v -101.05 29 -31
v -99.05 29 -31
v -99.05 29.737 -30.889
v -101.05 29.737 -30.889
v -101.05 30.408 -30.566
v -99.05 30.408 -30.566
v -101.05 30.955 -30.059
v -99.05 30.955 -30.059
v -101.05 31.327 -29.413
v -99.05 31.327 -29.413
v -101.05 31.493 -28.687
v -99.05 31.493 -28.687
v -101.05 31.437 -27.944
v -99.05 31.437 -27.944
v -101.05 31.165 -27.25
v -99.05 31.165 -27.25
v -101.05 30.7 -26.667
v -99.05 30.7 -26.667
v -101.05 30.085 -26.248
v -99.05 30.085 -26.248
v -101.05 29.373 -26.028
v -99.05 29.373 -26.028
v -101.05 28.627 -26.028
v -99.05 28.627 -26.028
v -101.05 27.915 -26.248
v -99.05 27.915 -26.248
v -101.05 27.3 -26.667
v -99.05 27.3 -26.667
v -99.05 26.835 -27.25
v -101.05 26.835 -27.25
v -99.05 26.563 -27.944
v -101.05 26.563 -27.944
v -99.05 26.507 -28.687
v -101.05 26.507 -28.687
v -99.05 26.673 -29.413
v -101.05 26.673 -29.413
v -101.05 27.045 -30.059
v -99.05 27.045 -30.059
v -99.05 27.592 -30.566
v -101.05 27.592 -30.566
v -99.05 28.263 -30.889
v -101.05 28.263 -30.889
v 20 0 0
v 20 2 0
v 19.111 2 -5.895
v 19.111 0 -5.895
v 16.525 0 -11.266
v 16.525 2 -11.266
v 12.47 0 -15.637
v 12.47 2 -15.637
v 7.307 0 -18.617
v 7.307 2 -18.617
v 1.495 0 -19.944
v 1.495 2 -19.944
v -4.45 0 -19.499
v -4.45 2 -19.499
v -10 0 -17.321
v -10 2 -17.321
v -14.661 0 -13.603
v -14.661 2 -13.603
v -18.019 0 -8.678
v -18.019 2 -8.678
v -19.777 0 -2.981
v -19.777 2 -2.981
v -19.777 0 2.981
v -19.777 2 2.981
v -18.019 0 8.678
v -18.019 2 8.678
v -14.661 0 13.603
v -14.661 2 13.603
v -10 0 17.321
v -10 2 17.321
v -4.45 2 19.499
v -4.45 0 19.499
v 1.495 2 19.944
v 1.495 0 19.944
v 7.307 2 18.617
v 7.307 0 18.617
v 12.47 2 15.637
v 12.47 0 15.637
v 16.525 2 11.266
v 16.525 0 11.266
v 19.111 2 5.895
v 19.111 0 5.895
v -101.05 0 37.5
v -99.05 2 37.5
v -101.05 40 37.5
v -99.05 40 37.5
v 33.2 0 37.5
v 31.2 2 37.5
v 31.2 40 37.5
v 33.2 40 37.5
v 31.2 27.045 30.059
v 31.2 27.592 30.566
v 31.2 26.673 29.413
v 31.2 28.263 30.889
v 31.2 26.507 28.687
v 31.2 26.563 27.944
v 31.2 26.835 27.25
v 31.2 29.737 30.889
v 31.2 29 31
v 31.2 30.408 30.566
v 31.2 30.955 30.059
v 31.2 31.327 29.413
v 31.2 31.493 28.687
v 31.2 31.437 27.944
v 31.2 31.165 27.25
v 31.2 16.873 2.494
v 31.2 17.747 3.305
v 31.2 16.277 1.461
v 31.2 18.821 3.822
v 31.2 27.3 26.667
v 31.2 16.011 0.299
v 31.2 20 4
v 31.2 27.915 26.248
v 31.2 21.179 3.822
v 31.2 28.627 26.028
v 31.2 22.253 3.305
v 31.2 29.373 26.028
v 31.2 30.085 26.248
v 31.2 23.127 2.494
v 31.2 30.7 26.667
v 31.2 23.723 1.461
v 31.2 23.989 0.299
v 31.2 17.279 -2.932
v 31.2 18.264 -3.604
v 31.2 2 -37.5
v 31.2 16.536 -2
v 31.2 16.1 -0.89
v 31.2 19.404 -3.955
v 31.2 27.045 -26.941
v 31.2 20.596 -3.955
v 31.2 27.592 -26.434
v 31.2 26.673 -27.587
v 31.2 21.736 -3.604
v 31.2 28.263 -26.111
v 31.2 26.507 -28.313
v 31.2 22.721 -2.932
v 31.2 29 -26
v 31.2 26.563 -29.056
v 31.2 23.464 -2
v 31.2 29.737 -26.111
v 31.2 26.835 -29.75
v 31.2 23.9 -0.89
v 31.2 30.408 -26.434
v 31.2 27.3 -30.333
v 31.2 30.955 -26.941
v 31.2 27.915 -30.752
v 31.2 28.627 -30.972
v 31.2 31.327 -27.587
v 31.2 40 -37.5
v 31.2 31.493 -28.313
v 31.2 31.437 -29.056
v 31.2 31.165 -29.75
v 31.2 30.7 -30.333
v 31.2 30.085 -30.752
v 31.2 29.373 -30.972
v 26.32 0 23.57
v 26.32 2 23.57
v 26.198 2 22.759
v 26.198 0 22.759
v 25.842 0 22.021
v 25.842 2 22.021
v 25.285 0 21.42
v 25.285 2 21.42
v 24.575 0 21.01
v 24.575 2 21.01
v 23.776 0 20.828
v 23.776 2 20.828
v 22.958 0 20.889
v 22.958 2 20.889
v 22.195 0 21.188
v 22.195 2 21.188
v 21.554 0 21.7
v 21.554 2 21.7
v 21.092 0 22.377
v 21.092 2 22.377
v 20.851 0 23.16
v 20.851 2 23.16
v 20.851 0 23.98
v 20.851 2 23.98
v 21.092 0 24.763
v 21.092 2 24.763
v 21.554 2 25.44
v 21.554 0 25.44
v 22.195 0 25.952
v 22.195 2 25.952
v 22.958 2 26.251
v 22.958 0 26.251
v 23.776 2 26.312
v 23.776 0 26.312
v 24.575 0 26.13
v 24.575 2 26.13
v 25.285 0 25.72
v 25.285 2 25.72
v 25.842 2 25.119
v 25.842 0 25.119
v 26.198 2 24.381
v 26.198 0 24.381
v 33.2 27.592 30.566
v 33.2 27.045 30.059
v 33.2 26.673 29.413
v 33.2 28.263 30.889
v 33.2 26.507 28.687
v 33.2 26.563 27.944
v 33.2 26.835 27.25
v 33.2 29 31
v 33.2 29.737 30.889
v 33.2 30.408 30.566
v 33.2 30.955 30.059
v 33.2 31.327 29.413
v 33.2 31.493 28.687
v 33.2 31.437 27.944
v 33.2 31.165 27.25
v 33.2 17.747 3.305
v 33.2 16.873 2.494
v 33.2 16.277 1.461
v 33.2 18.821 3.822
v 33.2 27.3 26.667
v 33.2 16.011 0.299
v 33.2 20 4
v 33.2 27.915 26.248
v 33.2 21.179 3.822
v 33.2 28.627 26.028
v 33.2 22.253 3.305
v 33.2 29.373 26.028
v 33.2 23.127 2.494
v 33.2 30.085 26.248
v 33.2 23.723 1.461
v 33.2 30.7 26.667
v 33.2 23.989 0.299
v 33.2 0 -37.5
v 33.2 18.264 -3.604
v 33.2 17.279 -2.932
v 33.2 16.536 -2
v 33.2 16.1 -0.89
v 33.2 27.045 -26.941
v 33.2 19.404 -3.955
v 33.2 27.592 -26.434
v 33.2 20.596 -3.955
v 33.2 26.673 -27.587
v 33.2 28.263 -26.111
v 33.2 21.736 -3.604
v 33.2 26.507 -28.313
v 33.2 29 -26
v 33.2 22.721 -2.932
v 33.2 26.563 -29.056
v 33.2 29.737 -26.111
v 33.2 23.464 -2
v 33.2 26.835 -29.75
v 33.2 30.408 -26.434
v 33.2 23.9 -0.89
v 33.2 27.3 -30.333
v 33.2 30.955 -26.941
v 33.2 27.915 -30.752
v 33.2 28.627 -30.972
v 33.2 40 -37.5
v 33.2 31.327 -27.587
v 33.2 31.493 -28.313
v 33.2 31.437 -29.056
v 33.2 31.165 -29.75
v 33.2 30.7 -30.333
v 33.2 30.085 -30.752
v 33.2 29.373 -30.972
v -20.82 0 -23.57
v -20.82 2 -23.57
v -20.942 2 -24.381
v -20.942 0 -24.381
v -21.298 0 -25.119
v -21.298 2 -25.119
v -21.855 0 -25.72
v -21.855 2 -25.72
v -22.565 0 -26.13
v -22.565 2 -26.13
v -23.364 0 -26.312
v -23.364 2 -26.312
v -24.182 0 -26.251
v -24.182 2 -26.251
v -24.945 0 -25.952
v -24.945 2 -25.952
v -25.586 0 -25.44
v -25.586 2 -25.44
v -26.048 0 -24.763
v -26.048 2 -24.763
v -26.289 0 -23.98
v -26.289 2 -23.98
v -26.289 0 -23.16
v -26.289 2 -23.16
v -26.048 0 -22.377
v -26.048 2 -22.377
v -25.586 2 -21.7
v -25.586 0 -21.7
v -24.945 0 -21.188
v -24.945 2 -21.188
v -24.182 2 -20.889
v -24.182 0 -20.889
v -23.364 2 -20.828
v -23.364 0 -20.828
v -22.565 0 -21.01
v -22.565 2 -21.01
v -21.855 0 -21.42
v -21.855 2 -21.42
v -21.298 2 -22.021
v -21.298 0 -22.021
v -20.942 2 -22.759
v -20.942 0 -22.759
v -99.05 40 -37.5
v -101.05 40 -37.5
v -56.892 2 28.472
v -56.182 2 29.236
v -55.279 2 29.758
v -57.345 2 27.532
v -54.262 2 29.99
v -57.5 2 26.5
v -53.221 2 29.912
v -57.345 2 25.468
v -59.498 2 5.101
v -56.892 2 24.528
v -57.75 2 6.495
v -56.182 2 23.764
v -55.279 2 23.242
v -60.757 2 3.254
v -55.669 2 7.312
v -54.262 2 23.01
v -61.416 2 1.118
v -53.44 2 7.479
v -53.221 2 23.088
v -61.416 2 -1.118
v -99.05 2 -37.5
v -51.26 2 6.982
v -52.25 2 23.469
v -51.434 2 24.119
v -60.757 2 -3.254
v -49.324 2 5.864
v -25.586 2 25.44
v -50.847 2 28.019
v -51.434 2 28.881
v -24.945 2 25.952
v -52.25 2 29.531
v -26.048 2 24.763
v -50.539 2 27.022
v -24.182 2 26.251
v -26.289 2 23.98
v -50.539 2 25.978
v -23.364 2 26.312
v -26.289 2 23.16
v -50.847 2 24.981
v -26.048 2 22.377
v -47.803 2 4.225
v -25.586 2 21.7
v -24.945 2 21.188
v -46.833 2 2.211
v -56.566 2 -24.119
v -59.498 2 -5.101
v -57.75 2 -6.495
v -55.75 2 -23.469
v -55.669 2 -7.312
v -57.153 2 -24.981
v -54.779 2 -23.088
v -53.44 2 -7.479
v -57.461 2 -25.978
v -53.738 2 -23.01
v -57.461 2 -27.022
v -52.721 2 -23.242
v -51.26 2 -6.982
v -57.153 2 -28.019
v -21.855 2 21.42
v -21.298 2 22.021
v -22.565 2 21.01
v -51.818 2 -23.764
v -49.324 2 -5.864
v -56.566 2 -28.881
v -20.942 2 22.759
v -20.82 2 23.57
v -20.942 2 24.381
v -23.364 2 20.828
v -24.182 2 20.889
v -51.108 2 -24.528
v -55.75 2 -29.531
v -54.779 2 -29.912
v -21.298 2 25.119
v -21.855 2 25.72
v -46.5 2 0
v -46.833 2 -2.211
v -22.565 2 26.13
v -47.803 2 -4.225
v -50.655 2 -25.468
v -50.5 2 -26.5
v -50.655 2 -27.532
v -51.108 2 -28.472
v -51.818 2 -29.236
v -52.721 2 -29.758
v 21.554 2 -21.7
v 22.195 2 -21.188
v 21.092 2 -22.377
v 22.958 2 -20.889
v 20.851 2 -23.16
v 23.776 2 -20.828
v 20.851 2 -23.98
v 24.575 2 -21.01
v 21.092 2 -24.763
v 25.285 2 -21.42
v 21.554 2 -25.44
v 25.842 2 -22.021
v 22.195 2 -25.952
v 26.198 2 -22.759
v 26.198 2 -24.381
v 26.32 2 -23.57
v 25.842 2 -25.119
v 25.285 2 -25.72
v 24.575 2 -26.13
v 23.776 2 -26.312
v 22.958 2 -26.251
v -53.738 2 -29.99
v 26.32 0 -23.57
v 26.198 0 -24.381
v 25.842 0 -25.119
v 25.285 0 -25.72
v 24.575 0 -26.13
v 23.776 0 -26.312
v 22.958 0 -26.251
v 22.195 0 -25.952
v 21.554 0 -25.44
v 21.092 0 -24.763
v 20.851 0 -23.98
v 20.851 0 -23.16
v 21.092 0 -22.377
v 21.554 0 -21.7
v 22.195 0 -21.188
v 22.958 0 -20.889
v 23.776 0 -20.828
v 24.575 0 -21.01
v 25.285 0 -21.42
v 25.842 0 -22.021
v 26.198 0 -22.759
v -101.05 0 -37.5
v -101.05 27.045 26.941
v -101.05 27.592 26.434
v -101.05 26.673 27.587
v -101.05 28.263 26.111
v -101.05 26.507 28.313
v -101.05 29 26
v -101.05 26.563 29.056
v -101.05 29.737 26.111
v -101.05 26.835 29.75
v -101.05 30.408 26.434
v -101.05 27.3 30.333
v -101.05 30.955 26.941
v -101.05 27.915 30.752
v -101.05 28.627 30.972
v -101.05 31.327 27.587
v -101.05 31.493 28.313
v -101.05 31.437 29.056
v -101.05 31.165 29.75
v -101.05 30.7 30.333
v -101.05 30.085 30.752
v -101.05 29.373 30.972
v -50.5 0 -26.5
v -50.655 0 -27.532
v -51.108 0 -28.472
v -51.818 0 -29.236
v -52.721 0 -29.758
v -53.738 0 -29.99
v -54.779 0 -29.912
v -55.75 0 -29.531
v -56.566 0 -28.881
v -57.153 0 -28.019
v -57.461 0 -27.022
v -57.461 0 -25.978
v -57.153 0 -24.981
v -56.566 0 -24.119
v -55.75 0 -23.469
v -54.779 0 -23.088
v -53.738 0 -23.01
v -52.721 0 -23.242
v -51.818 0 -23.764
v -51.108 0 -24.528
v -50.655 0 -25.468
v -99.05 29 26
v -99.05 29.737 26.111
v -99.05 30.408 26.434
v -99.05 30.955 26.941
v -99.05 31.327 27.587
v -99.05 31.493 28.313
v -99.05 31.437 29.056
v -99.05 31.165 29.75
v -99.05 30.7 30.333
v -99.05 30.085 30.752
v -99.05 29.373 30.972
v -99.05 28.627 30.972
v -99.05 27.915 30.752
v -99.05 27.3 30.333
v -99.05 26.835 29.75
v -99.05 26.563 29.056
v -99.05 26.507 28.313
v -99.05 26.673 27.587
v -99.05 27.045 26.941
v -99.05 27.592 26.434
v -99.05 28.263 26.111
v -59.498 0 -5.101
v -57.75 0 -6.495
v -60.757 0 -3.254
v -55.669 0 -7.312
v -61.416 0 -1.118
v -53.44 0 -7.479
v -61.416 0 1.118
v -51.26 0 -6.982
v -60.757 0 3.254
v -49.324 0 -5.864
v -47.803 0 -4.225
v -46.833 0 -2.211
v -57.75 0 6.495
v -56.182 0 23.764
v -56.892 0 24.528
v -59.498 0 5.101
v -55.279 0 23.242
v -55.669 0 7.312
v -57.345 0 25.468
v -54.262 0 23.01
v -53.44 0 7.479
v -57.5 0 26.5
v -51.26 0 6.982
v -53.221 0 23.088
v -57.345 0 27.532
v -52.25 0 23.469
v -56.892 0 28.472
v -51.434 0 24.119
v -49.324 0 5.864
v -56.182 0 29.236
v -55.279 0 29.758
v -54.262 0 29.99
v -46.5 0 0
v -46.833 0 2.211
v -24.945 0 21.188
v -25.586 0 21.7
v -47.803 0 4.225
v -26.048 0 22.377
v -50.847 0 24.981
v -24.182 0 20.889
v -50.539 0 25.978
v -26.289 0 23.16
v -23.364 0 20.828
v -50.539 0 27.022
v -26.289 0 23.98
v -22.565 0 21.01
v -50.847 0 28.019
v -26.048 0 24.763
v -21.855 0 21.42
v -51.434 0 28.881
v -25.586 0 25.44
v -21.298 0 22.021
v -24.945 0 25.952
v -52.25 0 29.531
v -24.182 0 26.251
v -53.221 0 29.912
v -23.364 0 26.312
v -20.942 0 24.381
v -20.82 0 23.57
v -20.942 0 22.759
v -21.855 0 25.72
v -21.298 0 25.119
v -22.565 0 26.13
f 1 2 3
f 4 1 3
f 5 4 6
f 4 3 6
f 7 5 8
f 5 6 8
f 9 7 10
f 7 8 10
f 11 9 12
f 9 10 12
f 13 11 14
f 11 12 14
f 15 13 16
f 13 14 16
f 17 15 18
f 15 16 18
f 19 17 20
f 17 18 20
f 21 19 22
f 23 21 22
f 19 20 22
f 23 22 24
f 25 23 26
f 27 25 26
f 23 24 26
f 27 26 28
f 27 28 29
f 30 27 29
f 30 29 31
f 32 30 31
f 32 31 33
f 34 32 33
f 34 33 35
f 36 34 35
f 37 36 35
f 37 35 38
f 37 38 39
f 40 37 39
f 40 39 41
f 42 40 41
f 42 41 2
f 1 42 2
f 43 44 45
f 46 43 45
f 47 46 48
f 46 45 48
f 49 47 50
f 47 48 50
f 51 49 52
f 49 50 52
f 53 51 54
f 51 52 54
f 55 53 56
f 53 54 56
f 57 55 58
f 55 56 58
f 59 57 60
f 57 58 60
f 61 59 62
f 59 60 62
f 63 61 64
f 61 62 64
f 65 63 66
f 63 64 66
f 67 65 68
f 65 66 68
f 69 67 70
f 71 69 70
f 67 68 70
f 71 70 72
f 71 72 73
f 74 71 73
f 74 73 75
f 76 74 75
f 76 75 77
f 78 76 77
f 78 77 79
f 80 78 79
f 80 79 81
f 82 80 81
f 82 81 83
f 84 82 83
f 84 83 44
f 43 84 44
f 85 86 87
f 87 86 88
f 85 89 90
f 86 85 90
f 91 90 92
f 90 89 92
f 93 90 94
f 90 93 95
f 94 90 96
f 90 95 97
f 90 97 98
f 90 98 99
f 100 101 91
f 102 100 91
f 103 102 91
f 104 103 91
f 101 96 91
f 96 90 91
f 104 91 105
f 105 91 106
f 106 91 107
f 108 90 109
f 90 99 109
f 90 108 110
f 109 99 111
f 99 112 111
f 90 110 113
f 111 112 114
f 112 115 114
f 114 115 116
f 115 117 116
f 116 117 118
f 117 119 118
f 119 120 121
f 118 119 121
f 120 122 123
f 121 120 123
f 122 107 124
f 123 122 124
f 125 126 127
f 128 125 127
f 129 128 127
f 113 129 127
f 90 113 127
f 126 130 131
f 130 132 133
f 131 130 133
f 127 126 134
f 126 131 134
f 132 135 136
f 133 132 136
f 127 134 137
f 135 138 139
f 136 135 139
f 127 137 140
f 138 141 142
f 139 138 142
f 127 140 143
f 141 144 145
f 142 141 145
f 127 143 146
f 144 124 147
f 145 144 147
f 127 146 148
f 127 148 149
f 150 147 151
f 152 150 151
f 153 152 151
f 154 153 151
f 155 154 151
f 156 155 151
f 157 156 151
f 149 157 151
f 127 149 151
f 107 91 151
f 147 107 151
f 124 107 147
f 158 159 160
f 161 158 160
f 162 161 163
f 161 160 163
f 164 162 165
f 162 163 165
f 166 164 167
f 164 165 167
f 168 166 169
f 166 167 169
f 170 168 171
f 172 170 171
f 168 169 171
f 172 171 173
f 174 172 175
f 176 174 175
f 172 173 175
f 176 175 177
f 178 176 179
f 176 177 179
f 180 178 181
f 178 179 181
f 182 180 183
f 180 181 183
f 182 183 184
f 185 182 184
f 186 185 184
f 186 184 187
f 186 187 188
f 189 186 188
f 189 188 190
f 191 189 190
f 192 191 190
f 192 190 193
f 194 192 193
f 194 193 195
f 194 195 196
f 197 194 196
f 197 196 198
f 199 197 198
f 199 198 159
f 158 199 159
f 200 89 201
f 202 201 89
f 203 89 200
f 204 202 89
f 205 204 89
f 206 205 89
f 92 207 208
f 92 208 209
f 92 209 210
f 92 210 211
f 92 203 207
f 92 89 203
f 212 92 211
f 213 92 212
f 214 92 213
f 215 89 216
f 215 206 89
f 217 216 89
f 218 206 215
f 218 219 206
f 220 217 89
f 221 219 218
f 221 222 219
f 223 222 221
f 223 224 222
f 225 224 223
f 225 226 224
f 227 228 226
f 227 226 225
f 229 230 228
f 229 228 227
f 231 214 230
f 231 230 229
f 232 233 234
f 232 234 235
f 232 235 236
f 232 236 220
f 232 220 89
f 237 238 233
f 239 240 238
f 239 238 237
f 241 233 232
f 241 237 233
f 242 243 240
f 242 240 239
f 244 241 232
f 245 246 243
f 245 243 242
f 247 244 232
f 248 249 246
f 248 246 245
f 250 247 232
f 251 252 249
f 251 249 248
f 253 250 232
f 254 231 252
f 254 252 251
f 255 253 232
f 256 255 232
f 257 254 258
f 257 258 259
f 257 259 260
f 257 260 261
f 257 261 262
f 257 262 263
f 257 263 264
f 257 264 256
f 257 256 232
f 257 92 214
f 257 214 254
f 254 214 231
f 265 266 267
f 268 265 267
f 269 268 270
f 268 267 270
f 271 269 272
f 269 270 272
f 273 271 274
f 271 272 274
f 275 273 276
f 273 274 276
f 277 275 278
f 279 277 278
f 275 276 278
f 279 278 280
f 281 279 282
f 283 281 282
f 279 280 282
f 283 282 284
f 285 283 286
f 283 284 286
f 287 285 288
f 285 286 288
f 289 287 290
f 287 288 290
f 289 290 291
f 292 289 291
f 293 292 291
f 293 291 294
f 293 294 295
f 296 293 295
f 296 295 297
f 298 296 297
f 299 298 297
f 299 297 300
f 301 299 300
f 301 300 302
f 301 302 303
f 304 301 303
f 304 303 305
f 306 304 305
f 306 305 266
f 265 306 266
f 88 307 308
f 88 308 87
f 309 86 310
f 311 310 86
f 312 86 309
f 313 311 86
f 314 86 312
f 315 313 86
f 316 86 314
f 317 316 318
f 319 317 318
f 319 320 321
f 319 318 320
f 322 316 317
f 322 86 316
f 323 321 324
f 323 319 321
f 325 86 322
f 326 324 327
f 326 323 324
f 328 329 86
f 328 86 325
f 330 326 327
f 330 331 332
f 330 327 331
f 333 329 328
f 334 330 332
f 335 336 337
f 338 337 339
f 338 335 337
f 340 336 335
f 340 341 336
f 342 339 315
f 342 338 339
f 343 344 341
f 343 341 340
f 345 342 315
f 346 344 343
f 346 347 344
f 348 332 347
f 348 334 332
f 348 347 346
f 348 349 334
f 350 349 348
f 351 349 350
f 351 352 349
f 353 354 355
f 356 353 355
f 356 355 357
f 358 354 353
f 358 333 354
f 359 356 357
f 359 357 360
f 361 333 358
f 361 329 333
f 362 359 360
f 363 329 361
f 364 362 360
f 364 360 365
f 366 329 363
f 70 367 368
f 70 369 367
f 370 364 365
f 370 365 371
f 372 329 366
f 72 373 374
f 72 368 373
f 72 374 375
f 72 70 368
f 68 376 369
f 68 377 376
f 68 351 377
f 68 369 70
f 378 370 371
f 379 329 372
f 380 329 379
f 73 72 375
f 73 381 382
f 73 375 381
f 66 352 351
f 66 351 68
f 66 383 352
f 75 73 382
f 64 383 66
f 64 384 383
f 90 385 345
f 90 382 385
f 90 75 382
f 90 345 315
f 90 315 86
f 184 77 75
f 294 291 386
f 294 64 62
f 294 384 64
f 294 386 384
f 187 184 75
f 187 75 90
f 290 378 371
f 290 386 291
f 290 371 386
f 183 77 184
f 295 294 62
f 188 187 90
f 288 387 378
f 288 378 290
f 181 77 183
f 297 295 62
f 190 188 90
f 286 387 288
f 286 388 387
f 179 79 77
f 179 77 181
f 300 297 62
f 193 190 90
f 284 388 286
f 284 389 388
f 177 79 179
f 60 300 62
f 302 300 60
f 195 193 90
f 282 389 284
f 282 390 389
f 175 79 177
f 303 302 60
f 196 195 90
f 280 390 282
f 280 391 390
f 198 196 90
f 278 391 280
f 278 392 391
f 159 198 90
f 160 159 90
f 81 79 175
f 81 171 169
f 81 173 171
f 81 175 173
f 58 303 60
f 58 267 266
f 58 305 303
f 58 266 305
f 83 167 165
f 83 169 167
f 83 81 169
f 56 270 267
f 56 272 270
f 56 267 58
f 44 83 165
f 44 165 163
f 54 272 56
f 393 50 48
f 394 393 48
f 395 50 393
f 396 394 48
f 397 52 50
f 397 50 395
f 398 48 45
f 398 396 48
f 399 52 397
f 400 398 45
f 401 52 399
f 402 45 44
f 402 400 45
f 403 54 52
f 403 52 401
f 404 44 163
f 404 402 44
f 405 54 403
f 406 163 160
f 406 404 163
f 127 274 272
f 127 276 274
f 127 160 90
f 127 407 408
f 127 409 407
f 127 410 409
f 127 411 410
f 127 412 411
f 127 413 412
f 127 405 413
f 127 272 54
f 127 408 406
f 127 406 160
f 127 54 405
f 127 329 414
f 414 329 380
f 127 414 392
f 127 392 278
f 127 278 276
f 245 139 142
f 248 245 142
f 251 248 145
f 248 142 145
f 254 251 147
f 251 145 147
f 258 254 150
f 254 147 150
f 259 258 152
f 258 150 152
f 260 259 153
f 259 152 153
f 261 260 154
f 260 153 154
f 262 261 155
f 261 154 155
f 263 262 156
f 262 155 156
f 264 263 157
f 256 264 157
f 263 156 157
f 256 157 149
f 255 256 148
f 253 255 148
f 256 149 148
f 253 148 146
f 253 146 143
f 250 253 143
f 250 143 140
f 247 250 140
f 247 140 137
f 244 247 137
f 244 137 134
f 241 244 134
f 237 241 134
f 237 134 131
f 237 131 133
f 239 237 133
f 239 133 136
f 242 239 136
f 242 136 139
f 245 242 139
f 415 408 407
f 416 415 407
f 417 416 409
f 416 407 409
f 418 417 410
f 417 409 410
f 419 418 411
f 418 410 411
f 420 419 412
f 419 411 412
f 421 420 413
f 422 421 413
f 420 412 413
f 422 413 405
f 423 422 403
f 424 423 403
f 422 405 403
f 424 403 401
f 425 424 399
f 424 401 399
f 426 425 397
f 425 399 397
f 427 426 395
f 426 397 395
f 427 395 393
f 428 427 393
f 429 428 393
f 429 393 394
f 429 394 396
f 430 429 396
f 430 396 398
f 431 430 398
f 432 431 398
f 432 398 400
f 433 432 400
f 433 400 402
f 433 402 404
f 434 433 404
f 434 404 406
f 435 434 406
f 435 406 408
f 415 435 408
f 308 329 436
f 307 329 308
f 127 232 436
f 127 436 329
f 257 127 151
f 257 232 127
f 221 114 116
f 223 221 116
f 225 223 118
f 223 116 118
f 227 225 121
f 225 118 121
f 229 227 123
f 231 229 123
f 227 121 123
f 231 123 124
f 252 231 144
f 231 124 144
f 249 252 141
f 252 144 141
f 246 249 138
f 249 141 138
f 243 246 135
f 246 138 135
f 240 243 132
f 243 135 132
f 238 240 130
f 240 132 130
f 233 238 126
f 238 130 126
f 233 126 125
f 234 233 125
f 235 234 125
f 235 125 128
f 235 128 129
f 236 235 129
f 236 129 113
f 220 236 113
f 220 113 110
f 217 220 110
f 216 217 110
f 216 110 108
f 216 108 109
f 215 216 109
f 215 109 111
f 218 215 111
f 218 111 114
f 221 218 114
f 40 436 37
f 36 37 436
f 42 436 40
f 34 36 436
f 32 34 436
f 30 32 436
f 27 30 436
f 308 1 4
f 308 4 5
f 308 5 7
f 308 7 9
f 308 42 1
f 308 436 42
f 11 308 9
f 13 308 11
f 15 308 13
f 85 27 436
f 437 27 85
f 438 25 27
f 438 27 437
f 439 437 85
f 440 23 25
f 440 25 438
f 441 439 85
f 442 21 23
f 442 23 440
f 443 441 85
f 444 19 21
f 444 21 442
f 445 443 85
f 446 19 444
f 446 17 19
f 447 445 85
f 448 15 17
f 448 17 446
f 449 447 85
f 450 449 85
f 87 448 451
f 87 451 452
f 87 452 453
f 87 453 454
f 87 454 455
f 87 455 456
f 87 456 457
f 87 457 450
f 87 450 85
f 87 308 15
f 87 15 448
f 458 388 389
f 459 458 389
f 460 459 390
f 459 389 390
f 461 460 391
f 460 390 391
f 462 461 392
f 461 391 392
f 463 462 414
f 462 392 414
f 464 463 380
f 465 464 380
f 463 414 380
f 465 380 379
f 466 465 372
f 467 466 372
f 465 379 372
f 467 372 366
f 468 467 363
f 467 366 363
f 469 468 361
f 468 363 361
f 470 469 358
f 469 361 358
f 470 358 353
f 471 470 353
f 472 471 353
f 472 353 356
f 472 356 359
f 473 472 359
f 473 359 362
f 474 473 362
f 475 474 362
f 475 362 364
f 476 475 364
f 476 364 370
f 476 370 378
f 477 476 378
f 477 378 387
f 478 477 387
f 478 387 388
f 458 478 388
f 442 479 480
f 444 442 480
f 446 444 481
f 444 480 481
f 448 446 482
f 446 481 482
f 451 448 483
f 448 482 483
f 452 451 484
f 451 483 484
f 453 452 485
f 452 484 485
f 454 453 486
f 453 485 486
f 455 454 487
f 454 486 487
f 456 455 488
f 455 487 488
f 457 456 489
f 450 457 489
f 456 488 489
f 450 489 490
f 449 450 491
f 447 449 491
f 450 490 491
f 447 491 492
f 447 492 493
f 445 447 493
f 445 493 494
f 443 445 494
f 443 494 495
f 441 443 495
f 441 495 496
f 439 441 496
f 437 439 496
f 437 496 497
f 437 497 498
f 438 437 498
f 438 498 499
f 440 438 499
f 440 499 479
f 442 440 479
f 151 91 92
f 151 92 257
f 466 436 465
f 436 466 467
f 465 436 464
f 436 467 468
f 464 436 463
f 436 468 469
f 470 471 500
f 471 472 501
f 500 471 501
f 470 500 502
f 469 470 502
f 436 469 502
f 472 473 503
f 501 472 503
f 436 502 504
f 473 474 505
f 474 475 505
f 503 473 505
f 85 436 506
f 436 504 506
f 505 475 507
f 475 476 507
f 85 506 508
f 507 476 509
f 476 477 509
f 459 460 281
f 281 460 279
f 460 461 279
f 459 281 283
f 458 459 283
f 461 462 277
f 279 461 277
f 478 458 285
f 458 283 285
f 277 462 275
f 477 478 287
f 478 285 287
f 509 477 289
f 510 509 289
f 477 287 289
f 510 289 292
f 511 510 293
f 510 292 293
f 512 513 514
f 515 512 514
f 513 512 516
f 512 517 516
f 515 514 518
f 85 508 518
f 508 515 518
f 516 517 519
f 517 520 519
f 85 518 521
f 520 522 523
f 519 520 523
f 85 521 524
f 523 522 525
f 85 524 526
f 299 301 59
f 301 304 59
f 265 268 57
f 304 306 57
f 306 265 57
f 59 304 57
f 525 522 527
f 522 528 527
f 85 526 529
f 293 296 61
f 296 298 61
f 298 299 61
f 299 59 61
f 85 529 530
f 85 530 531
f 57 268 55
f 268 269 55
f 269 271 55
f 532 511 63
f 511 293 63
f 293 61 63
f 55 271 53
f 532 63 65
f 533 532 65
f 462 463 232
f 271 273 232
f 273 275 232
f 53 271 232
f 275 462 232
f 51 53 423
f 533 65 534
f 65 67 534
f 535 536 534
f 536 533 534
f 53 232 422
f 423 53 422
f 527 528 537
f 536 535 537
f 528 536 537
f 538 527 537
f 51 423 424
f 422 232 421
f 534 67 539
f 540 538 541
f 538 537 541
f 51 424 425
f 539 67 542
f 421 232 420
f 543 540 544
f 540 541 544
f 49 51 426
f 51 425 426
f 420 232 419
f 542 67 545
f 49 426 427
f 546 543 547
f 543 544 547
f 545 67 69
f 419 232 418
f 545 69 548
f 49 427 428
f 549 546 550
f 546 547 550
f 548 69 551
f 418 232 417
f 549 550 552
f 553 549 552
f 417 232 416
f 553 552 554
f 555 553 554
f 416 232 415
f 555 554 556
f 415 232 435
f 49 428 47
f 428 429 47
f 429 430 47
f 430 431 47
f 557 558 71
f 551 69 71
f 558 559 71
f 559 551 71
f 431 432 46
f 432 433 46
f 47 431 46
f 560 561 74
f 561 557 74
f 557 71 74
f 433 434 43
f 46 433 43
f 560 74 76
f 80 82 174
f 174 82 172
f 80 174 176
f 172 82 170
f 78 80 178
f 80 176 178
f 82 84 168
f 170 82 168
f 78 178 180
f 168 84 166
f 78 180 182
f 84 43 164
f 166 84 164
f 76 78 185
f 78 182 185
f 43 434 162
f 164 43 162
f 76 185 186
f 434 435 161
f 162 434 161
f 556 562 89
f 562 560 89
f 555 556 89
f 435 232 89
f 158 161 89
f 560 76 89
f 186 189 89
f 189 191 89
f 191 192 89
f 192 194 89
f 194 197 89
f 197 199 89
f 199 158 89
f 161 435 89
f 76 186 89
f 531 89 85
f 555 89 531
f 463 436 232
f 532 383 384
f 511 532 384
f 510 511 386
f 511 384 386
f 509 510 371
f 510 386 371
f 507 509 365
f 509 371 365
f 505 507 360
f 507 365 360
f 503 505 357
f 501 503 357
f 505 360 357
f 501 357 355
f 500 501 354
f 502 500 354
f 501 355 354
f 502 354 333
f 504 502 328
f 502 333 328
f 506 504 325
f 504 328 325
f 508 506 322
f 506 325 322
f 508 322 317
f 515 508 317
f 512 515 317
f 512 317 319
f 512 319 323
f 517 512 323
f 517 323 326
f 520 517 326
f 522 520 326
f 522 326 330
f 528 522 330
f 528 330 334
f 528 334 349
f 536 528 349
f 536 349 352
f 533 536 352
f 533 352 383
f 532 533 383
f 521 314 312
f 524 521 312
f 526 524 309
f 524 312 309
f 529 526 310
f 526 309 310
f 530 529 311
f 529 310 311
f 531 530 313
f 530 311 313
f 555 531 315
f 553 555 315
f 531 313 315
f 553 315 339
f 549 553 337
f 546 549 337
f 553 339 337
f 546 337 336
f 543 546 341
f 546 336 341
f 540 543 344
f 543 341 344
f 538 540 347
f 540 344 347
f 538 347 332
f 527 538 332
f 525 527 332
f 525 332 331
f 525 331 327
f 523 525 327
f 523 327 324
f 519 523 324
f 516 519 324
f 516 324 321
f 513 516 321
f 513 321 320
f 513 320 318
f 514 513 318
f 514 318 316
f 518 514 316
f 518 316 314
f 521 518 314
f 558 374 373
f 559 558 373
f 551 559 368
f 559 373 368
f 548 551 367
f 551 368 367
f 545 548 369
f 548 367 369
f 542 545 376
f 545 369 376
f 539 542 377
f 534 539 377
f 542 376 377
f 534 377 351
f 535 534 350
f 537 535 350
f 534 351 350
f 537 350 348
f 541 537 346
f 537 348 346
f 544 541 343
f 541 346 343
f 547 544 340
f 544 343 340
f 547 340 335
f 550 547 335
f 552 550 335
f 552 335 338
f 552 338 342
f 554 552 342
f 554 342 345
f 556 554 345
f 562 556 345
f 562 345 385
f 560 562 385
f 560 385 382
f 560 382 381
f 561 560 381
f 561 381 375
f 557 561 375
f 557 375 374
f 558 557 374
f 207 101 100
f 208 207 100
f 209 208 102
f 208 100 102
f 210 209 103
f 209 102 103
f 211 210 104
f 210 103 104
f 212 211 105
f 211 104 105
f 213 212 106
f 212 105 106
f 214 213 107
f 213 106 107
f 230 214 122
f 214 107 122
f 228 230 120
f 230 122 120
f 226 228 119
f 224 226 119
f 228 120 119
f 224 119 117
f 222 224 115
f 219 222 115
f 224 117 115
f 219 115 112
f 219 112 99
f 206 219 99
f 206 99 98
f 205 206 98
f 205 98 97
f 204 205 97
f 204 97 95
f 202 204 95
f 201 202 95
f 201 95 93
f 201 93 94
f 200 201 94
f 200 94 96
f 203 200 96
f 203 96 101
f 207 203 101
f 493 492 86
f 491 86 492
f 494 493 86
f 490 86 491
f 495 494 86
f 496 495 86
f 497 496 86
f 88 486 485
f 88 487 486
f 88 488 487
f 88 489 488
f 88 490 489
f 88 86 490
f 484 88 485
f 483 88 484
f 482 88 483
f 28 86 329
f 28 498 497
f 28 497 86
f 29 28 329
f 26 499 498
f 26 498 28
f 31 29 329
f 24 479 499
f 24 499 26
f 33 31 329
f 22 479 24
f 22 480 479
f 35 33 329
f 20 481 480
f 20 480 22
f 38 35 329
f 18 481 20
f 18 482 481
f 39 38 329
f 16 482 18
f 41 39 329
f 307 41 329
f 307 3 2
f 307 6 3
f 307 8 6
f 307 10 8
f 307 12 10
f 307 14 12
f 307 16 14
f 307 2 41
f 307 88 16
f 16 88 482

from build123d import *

# Parameters (mm, degrees)
ESBO_O1_W                = 62.4
ESBO_O1_H                = 75
RESSALTO_EXTRUS_O1_DEPTH = 2
ESBO_O2_W                = 75
ESBO_O2_H                = 40
RESSALTO_EXTRUS_O2_DEPTH = 2
ESBO_O3_R                = 2.5
CORTE_EXTRUS_O1_DEPTH    = 67.4
ESBO_O4_R                = 20
CORTE_EXTRUS_O2_DEPTH    = 5
ESBO_O5_R                = 2.75
CORTE_EXTRUS_O3_DEPTH    = 3
ESBO_O11_W               = 75
ESBO_O11_H               = 40
RESSALTO_EXTRUS_O3_DEPTH = 67.85
ESBO_O12_W               = 75
ESBO_O12_H               = 38
CORTE_EXTRUS_O4_DEPTH    = 67.85
ESBO_O13_R               = 2.5
CORTE_EXTRUS_O5_DEPTH    = 64.1
ESBO_O14_R               = 7.5
CORTE_EXTRUS_O6_DEPTH    = 10
CORTE_EXTRUS_O7_DEPTH    = 10
ESBO_O17_R               = 4
CORTE_EXTRUS_O8_DEPTH    = 10


with BuildPart() as part:
    # Esboço1 → Ressalto-extrusão1 (new body)
    with BuildSketch(Plane(origin=(0, 0, 0), x_dir=(1, 0, 0), z_dir=(0, 1, 0))):
        Rectangle(ESBO_O1_W, ESBO_O1_H)
    extrude(amount=RESSALTO_EXTRUS_O1_DEPTH)

    # Esboço2 → Ressalto-extrusão2 (add)
    with BuildSketch(Plane(origin=(31.2, 0, 0), x_dir=(0, 0, -1), z_dir=(1, 0, 0))):
        with Locations((0, 20)):
            Rectangle(ESBO_O2_W, ESBO_O2_H)
    ressalto_extrus_o2 = extrude(amount=RESSALTO_EXTRUS_O2_DEPTH)

    # Espelhar1: Ressalto-extrusão2 across plane
    add(ressalto_extrus_o2.mirror(Plane(origin=(0, 0, 0), x_dir=(0, 0, 1), z_dir=(1, 0, 0))))

    # Esboço3 → Corte-extrusão1 (cut, through all)
    with BuildSketch(Plane.ZY.offset(33.2)):
        with Locations((-28.5, 29)):
            Circle(ESBO_O3_R)
        with Locations((28.5, 29)):
            Circle(ESBO_O3_R)
    extrude(amount=-CORTE_EXTRUS_O1_DEPTH, mode=Mode.SUBTRACT)

    # Esboço4 → Corte-extrusão2 (cut)
    with BuildSketch(Plane(origin=(0, 2, 0), x_dir=(1, 0, 0), z_dir=(0, 1, 0))):
        Circle(ESBO_O4_R)
    extrude(amount=-CORTE_EXTRUS_O2_DEPTH, mode=Mode.SUBTRACT)

    # Esboço5 → Corte-extrusão3 (cut, through all)
    with BuildSketch(Plane(origin=(0, 2, 0), x_dir=(1, 0, 0), z_dir=(0, 1, 0))):
        with Locations((23.57, 23.57)):
            Circle(ESBO_O5_R)
        with Locations((23.57, -23.57)):
            Circle(ESBO_O5_R)
        with Locations((-23.57, -23.57)):
            Circle(ESBO_O5_R)
        with Locations((-23.57, 23.57)):
            Circle(ESBO_O5_R)
    extrude(amount=-CORTE_EXTRUS_O3_DEPTH, mode=Mode.SUBTRACT)

    # Esboço11 → Ressalto-extrusão3 (add)
    with BuildSketch(Plane.ZY.offset(33.2)):
        with Locations((0, 20)):
            Rectangle(ESBO_O11_W, ESBO_O11_H)
    extrude(amount=RESSALTO_EXTRUS_O3_DEPTH)

    # Esboço12 → Corte-extrusão4 (cut)
    with BuildSketch(Plane(origin=(-31.2, 0, 0), x_dir=(0, 0, -1), z_dir=(1, 0, 0))):
        with Locations((0, 21)):
            Rectangle(ESBO_O12_W, ESBO_O12_H)
    extrude(amount=-CORTE_EXTRUS_O4_DEPTH, mode=Mode.SUBTRACT)

    # Esboço13 → Corte-extrusão5 (cut)
    with BuildSketch(Plane(origin=(-99.05, 0, 0), x_dir=(0, 0, -1), z_dir=(1, 0, 0))):
        with Locations((28.5, 29)):
            Circle(ESBO_O13_R)
        with Locations((-28.5, 29)):
            Circle(ESBO_O13_R)
    extrude(amount=-CORTE_EXTRUS_O5_DEPTH, mode=Mode.SUBTRACT)

    # Esboço14 → Corte-extrusão6 (cut)
    with BuildSketch(Plane(origin=(0, 2, 0), x_dir=(1, 0, 0), z_dir=(0, 1, 0))):
        with Locations((-54, 0)):
            Circle(ESBO_O14_R)
    extrude(amount=-CORTE_EXTRUS_O6_DEPTH, mode=Mode.SUBTRACT)

    # Esboço16 → Corte-extrusão7 (cut)
    with BuildSketch(Plane(origin=(0, 2, 0), x_dir=(1, 0, 0), z_dir=(0, 1, 0))):
        with BuildLine():
            ThreePointArc((-57.5, 26.5), (-54, 23), (-50.5, 26.5))
            ThreePointArc((-50.5, 26.5), (-54, 30), (-57.5, 26.5))
        make_face()
        with BuildLine():
            ThreePointArc((-50.5, -26.5), (-54, -23), (-57.5, -26.5))
            ThreePointArc((-57.5, -26.5), (-54, -30), (-50.5, -26.5))
        make_face()
    extrude(amount=-CORTE_EXTRUS_O7_DEPTH, mode=Mode.SUBTRACT)

    # Esboço17 → Corte-extrusão8 (cut)
    with BuildSketch(Plane.ZY.offset(-31.2)):
        with Locations((0, 20)):
            Circle(ESBO_O17_R)
    extrude(amount=-CORTE_EXTRUS_O8_DEPTH, mode=Mode.SUBTRACT)


solid = part.part
